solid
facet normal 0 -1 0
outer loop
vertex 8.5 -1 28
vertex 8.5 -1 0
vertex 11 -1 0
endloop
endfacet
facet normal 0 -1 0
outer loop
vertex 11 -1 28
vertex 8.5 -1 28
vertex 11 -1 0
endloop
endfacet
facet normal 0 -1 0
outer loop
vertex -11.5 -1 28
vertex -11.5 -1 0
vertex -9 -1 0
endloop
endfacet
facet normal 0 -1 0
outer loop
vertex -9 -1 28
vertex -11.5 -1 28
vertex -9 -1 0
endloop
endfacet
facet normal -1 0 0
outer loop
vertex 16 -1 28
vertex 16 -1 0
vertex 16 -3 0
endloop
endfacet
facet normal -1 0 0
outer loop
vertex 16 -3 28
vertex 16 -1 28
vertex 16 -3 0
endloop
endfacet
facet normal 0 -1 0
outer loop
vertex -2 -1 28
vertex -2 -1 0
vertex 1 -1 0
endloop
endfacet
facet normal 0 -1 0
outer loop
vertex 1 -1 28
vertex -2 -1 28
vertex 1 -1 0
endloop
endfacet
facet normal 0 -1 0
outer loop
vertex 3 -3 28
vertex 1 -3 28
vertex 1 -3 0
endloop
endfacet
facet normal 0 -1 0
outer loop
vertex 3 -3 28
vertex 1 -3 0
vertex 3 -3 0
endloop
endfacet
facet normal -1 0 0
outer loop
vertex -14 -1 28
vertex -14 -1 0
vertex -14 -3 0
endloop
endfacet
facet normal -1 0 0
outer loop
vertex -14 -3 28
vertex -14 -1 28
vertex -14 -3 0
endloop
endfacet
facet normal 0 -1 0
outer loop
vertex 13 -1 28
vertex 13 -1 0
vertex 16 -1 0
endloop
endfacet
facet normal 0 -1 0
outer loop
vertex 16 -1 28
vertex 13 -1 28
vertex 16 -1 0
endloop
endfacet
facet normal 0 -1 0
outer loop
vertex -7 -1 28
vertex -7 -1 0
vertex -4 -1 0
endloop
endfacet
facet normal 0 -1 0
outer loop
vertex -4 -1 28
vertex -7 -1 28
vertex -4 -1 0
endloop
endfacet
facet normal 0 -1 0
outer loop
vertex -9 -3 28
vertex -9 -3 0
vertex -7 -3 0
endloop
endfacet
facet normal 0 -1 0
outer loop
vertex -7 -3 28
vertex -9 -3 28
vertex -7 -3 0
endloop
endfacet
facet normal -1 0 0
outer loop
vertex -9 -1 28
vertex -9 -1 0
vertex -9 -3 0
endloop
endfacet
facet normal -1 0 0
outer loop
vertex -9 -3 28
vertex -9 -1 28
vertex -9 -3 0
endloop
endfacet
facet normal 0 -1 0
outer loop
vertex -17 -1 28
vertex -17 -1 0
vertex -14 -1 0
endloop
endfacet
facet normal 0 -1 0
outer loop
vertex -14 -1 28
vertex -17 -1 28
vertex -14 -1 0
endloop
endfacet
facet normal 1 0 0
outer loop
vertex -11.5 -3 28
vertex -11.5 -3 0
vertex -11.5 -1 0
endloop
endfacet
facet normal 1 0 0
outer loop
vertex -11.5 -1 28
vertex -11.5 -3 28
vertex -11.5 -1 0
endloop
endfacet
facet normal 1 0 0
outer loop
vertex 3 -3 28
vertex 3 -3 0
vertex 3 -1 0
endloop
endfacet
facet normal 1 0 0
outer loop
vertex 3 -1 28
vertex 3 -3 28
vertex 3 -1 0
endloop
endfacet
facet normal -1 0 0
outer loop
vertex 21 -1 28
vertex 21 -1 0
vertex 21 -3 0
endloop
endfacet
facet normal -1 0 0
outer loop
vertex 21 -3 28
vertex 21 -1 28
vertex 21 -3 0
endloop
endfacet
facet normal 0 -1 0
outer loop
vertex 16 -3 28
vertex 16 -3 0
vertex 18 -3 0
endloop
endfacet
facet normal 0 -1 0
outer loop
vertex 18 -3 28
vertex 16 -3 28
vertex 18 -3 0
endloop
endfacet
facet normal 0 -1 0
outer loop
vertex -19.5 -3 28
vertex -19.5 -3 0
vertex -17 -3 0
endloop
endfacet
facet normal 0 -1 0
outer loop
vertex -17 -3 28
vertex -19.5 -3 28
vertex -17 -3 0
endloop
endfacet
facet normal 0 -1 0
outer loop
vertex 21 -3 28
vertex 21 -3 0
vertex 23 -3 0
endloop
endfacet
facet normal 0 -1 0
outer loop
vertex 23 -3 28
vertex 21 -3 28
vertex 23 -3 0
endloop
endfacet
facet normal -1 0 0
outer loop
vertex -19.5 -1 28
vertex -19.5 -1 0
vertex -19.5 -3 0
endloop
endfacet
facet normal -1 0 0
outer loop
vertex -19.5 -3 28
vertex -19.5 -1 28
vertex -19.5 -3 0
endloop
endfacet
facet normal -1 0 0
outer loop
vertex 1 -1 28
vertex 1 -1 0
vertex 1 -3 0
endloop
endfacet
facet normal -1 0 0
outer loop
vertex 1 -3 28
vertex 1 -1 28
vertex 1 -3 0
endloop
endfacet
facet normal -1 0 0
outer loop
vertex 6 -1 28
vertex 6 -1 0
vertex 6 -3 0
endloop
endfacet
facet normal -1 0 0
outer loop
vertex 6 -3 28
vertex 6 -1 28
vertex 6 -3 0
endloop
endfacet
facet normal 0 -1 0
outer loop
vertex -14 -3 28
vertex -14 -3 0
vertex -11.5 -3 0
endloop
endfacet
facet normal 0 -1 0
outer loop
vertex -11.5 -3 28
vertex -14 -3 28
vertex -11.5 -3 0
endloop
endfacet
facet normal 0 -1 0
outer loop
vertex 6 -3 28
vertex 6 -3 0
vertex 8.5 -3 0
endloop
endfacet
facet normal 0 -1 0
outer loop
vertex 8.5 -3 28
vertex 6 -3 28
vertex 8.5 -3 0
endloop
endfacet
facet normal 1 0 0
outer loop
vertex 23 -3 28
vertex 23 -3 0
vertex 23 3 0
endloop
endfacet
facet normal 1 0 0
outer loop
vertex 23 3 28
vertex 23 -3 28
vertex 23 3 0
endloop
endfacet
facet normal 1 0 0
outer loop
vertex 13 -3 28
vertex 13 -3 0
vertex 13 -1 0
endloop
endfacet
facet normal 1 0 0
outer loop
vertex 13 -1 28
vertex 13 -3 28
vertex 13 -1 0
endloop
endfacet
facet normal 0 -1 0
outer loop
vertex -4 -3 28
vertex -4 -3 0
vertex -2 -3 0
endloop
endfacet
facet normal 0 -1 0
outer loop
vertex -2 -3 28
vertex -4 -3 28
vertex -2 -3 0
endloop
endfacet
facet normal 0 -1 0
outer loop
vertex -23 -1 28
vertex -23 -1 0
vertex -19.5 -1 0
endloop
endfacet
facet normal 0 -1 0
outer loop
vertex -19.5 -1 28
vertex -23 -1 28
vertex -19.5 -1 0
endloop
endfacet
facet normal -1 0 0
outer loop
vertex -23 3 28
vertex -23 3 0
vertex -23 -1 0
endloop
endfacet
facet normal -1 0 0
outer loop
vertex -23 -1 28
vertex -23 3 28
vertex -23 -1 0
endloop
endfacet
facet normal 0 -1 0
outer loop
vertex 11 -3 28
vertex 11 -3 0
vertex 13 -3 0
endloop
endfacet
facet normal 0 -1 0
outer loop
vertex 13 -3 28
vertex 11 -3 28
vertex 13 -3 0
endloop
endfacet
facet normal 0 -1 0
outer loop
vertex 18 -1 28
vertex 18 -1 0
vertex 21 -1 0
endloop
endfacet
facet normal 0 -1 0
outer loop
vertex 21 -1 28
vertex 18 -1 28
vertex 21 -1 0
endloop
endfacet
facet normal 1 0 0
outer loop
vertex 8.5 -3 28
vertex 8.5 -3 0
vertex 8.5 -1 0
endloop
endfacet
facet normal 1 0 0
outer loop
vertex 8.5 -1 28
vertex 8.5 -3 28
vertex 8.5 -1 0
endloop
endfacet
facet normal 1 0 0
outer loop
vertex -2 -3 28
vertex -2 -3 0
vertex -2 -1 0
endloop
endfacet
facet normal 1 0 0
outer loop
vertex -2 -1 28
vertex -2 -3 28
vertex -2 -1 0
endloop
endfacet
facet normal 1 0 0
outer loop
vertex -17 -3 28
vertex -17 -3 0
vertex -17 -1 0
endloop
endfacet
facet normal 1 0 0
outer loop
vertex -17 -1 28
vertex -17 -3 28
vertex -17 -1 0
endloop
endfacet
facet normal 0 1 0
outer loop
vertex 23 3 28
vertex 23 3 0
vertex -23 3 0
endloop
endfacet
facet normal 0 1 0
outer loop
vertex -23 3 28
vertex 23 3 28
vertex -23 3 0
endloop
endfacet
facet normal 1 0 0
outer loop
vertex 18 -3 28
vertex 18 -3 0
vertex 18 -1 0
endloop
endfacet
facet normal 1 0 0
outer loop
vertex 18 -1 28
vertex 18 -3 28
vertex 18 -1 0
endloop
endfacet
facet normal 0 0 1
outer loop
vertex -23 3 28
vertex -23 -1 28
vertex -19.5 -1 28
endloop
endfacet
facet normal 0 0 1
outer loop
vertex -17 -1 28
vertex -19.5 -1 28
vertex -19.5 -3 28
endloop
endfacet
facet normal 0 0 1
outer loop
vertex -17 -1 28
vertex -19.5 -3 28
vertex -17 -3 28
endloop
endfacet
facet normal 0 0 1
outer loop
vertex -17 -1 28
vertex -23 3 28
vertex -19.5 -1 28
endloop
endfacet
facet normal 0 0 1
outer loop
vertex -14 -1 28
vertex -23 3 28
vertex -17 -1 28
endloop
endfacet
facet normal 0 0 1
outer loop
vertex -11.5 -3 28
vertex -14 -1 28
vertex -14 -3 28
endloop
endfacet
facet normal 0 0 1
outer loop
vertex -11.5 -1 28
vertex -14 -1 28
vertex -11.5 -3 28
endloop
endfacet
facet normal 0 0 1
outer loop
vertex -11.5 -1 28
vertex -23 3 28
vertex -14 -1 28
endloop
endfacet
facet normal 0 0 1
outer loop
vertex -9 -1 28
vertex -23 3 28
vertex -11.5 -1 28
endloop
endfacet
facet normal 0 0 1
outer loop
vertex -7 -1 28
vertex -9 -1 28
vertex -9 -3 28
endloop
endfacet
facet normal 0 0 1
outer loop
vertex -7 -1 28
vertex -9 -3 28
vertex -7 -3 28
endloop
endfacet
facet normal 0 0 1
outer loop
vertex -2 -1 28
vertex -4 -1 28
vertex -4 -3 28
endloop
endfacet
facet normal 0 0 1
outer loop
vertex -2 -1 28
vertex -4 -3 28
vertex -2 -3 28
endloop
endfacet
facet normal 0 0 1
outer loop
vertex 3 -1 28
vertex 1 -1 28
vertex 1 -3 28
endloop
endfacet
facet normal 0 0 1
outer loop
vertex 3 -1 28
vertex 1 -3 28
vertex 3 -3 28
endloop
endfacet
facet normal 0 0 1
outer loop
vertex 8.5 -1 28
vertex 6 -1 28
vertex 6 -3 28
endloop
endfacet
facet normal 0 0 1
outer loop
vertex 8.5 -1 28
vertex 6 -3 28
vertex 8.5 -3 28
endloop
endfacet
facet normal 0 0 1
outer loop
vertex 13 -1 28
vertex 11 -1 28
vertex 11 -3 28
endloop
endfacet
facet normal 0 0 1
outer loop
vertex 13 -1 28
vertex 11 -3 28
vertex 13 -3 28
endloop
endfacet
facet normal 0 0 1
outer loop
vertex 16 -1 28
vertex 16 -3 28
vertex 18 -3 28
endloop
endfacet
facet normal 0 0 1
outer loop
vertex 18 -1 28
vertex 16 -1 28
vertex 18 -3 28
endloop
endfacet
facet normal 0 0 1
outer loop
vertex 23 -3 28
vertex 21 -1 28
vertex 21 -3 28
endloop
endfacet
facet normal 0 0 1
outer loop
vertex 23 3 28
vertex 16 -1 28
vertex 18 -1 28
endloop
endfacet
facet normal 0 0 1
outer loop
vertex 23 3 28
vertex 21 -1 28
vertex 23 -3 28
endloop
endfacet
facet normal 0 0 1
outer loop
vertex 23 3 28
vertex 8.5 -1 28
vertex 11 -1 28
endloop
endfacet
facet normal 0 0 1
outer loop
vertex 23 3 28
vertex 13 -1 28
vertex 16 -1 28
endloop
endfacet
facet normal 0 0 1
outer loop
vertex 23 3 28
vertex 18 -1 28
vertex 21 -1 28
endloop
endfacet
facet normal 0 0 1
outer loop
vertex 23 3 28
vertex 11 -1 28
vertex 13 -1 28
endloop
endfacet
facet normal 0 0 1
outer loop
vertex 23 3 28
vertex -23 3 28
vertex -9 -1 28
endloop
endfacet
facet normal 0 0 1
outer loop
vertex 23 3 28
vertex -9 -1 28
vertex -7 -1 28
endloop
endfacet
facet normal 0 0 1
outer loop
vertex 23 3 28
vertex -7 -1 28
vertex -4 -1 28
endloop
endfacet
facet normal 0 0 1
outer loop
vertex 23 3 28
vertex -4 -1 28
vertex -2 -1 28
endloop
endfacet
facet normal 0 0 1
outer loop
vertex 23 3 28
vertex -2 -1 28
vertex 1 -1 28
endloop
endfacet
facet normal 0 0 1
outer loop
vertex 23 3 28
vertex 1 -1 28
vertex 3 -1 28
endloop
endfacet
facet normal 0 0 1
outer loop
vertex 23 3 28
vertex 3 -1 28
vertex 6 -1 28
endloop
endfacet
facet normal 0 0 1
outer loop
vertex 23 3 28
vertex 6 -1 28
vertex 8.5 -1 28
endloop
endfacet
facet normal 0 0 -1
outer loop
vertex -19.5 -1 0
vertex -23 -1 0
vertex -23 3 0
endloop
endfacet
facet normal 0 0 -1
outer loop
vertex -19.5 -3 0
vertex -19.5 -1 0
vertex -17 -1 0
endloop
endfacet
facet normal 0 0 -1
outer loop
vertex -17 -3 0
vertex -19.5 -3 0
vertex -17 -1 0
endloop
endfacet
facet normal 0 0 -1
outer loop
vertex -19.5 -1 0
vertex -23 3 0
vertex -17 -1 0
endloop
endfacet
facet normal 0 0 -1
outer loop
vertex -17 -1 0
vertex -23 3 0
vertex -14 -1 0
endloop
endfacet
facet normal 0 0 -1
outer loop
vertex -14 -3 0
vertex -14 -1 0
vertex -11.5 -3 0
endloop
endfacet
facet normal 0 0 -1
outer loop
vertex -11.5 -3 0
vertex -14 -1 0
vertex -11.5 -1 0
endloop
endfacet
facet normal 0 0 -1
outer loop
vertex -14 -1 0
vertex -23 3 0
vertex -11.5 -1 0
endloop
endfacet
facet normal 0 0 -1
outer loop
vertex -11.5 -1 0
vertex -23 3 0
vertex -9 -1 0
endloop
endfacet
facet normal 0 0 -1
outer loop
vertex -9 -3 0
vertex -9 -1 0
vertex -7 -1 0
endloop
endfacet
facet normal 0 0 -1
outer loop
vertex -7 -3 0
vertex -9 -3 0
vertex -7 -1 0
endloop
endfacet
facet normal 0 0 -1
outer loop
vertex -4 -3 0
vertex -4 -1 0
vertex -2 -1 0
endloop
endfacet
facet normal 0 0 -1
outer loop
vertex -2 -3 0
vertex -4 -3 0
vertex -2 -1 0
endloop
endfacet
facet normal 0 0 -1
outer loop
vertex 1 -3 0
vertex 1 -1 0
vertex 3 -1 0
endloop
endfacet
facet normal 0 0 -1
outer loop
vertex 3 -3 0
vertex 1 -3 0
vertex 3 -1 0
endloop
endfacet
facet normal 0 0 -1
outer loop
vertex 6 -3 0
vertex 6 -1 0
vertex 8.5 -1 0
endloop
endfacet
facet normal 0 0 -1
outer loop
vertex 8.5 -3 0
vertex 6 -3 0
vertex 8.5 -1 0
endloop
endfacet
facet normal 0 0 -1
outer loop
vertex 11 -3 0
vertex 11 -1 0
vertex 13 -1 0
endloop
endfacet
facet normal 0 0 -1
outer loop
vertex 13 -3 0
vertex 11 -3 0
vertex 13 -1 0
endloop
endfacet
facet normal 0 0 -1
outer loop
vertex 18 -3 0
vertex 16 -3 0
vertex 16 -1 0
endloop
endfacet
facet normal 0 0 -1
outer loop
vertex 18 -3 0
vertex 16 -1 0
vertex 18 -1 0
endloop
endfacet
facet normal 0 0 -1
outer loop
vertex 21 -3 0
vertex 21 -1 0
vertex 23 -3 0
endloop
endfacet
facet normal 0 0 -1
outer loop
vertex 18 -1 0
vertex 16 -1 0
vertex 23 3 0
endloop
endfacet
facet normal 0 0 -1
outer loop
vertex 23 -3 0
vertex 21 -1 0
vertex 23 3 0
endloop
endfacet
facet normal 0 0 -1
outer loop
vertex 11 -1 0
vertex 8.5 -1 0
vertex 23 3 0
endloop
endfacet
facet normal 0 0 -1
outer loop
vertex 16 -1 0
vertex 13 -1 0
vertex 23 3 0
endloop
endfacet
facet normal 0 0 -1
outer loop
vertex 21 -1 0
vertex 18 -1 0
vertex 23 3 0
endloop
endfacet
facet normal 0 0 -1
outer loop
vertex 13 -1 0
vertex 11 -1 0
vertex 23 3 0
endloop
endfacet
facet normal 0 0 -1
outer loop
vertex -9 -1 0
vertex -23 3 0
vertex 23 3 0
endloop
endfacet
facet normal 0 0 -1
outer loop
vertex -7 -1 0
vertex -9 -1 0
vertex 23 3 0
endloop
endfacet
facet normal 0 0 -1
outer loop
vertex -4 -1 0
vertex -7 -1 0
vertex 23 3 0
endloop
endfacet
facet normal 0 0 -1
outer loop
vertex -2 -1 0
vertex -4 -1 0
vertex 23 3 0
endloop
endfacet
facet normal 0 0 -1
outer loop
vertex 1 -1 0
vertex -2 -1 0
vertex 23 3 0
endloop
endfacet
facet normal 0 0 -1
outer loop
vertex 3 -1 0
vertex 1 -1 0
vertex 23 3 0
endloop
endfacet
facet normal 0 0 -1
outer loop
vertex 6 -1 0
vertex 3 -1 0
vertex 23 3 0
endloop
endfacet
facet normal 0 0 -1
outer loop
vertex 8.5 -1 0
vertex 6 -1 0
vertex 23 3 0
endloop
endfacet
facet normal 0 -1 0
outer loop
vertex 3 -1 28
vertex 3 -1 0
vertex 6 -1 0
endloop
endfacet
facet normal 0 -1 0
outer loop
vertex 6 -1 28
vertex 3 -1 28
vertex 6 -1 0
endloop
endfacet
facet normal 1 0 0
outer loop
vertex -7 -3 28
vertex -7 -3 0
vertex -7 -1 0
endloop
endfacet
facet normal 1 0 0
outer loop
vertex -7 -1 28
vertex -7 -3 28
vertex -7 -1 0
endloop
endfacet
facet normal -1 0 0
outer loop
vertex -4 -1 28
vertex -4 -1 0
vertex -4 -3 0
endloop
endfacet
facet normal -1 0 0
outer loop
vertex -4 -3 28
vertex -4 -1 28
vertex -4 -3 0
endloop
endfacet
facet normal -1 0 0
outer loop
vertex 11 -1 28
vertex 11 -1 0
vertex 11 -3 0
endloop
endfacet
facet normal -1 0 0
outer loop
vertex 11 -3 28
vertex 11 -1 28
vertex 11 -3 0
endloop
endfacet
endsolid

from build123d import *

# Parameters (mm, degrees)
BOSS_EXTRUDE1_DEPTH = 28


with BuildPart() as part:
    # Sketch1 → Boss-Extrude1 (new body)
    with BuildSketch(Plane.XY):
        Polygon((-23, -1.000000551), (-19.500008127, -1.000000551), (-19.500008127, -3), (-17.000007621, -3), (-17.000007621, -1.000000551), (-14.000005953, -1.000000551), (-14.000005953, -3), (-11.500005447, -3), (-11.500005447, -1.000000551), (-9.000004942, -1.000000551), (-9.000004942, -3), (-7.000005493, -3), (-7.000005493, -1.000000551), (-4.000003825, -1.000000551), (-4.000003825, -3), (-2.000004376, -3), (-2.000004376, -1.000000551), (0.999997292, -1.000000551), (0.999997292, -3), (2.99999674, -3), (2.99999674, -1.000000551), (5.999998408, -1.000000551), (5.999998408, -3), (8.499998914, -3), (8.499998914, -1.000000551), (10.99999942, -1.000000551), (10.99999942, -3), (12.999998868, -3), (12.999998868, -1.000000551), (16.000000536, -1.000000551), (16.000000536, -3), (17.999999985, -3), (17.999999985, -1.000000551), (21.000001653, -1.000000551), (21.000001653, -3), (23.000001102, -3), (23.000001102, 3), (-23, 3), align=None)
    extrude(amount=BOSS_EXTRUDE1_DEPTH)


solid = part.part
